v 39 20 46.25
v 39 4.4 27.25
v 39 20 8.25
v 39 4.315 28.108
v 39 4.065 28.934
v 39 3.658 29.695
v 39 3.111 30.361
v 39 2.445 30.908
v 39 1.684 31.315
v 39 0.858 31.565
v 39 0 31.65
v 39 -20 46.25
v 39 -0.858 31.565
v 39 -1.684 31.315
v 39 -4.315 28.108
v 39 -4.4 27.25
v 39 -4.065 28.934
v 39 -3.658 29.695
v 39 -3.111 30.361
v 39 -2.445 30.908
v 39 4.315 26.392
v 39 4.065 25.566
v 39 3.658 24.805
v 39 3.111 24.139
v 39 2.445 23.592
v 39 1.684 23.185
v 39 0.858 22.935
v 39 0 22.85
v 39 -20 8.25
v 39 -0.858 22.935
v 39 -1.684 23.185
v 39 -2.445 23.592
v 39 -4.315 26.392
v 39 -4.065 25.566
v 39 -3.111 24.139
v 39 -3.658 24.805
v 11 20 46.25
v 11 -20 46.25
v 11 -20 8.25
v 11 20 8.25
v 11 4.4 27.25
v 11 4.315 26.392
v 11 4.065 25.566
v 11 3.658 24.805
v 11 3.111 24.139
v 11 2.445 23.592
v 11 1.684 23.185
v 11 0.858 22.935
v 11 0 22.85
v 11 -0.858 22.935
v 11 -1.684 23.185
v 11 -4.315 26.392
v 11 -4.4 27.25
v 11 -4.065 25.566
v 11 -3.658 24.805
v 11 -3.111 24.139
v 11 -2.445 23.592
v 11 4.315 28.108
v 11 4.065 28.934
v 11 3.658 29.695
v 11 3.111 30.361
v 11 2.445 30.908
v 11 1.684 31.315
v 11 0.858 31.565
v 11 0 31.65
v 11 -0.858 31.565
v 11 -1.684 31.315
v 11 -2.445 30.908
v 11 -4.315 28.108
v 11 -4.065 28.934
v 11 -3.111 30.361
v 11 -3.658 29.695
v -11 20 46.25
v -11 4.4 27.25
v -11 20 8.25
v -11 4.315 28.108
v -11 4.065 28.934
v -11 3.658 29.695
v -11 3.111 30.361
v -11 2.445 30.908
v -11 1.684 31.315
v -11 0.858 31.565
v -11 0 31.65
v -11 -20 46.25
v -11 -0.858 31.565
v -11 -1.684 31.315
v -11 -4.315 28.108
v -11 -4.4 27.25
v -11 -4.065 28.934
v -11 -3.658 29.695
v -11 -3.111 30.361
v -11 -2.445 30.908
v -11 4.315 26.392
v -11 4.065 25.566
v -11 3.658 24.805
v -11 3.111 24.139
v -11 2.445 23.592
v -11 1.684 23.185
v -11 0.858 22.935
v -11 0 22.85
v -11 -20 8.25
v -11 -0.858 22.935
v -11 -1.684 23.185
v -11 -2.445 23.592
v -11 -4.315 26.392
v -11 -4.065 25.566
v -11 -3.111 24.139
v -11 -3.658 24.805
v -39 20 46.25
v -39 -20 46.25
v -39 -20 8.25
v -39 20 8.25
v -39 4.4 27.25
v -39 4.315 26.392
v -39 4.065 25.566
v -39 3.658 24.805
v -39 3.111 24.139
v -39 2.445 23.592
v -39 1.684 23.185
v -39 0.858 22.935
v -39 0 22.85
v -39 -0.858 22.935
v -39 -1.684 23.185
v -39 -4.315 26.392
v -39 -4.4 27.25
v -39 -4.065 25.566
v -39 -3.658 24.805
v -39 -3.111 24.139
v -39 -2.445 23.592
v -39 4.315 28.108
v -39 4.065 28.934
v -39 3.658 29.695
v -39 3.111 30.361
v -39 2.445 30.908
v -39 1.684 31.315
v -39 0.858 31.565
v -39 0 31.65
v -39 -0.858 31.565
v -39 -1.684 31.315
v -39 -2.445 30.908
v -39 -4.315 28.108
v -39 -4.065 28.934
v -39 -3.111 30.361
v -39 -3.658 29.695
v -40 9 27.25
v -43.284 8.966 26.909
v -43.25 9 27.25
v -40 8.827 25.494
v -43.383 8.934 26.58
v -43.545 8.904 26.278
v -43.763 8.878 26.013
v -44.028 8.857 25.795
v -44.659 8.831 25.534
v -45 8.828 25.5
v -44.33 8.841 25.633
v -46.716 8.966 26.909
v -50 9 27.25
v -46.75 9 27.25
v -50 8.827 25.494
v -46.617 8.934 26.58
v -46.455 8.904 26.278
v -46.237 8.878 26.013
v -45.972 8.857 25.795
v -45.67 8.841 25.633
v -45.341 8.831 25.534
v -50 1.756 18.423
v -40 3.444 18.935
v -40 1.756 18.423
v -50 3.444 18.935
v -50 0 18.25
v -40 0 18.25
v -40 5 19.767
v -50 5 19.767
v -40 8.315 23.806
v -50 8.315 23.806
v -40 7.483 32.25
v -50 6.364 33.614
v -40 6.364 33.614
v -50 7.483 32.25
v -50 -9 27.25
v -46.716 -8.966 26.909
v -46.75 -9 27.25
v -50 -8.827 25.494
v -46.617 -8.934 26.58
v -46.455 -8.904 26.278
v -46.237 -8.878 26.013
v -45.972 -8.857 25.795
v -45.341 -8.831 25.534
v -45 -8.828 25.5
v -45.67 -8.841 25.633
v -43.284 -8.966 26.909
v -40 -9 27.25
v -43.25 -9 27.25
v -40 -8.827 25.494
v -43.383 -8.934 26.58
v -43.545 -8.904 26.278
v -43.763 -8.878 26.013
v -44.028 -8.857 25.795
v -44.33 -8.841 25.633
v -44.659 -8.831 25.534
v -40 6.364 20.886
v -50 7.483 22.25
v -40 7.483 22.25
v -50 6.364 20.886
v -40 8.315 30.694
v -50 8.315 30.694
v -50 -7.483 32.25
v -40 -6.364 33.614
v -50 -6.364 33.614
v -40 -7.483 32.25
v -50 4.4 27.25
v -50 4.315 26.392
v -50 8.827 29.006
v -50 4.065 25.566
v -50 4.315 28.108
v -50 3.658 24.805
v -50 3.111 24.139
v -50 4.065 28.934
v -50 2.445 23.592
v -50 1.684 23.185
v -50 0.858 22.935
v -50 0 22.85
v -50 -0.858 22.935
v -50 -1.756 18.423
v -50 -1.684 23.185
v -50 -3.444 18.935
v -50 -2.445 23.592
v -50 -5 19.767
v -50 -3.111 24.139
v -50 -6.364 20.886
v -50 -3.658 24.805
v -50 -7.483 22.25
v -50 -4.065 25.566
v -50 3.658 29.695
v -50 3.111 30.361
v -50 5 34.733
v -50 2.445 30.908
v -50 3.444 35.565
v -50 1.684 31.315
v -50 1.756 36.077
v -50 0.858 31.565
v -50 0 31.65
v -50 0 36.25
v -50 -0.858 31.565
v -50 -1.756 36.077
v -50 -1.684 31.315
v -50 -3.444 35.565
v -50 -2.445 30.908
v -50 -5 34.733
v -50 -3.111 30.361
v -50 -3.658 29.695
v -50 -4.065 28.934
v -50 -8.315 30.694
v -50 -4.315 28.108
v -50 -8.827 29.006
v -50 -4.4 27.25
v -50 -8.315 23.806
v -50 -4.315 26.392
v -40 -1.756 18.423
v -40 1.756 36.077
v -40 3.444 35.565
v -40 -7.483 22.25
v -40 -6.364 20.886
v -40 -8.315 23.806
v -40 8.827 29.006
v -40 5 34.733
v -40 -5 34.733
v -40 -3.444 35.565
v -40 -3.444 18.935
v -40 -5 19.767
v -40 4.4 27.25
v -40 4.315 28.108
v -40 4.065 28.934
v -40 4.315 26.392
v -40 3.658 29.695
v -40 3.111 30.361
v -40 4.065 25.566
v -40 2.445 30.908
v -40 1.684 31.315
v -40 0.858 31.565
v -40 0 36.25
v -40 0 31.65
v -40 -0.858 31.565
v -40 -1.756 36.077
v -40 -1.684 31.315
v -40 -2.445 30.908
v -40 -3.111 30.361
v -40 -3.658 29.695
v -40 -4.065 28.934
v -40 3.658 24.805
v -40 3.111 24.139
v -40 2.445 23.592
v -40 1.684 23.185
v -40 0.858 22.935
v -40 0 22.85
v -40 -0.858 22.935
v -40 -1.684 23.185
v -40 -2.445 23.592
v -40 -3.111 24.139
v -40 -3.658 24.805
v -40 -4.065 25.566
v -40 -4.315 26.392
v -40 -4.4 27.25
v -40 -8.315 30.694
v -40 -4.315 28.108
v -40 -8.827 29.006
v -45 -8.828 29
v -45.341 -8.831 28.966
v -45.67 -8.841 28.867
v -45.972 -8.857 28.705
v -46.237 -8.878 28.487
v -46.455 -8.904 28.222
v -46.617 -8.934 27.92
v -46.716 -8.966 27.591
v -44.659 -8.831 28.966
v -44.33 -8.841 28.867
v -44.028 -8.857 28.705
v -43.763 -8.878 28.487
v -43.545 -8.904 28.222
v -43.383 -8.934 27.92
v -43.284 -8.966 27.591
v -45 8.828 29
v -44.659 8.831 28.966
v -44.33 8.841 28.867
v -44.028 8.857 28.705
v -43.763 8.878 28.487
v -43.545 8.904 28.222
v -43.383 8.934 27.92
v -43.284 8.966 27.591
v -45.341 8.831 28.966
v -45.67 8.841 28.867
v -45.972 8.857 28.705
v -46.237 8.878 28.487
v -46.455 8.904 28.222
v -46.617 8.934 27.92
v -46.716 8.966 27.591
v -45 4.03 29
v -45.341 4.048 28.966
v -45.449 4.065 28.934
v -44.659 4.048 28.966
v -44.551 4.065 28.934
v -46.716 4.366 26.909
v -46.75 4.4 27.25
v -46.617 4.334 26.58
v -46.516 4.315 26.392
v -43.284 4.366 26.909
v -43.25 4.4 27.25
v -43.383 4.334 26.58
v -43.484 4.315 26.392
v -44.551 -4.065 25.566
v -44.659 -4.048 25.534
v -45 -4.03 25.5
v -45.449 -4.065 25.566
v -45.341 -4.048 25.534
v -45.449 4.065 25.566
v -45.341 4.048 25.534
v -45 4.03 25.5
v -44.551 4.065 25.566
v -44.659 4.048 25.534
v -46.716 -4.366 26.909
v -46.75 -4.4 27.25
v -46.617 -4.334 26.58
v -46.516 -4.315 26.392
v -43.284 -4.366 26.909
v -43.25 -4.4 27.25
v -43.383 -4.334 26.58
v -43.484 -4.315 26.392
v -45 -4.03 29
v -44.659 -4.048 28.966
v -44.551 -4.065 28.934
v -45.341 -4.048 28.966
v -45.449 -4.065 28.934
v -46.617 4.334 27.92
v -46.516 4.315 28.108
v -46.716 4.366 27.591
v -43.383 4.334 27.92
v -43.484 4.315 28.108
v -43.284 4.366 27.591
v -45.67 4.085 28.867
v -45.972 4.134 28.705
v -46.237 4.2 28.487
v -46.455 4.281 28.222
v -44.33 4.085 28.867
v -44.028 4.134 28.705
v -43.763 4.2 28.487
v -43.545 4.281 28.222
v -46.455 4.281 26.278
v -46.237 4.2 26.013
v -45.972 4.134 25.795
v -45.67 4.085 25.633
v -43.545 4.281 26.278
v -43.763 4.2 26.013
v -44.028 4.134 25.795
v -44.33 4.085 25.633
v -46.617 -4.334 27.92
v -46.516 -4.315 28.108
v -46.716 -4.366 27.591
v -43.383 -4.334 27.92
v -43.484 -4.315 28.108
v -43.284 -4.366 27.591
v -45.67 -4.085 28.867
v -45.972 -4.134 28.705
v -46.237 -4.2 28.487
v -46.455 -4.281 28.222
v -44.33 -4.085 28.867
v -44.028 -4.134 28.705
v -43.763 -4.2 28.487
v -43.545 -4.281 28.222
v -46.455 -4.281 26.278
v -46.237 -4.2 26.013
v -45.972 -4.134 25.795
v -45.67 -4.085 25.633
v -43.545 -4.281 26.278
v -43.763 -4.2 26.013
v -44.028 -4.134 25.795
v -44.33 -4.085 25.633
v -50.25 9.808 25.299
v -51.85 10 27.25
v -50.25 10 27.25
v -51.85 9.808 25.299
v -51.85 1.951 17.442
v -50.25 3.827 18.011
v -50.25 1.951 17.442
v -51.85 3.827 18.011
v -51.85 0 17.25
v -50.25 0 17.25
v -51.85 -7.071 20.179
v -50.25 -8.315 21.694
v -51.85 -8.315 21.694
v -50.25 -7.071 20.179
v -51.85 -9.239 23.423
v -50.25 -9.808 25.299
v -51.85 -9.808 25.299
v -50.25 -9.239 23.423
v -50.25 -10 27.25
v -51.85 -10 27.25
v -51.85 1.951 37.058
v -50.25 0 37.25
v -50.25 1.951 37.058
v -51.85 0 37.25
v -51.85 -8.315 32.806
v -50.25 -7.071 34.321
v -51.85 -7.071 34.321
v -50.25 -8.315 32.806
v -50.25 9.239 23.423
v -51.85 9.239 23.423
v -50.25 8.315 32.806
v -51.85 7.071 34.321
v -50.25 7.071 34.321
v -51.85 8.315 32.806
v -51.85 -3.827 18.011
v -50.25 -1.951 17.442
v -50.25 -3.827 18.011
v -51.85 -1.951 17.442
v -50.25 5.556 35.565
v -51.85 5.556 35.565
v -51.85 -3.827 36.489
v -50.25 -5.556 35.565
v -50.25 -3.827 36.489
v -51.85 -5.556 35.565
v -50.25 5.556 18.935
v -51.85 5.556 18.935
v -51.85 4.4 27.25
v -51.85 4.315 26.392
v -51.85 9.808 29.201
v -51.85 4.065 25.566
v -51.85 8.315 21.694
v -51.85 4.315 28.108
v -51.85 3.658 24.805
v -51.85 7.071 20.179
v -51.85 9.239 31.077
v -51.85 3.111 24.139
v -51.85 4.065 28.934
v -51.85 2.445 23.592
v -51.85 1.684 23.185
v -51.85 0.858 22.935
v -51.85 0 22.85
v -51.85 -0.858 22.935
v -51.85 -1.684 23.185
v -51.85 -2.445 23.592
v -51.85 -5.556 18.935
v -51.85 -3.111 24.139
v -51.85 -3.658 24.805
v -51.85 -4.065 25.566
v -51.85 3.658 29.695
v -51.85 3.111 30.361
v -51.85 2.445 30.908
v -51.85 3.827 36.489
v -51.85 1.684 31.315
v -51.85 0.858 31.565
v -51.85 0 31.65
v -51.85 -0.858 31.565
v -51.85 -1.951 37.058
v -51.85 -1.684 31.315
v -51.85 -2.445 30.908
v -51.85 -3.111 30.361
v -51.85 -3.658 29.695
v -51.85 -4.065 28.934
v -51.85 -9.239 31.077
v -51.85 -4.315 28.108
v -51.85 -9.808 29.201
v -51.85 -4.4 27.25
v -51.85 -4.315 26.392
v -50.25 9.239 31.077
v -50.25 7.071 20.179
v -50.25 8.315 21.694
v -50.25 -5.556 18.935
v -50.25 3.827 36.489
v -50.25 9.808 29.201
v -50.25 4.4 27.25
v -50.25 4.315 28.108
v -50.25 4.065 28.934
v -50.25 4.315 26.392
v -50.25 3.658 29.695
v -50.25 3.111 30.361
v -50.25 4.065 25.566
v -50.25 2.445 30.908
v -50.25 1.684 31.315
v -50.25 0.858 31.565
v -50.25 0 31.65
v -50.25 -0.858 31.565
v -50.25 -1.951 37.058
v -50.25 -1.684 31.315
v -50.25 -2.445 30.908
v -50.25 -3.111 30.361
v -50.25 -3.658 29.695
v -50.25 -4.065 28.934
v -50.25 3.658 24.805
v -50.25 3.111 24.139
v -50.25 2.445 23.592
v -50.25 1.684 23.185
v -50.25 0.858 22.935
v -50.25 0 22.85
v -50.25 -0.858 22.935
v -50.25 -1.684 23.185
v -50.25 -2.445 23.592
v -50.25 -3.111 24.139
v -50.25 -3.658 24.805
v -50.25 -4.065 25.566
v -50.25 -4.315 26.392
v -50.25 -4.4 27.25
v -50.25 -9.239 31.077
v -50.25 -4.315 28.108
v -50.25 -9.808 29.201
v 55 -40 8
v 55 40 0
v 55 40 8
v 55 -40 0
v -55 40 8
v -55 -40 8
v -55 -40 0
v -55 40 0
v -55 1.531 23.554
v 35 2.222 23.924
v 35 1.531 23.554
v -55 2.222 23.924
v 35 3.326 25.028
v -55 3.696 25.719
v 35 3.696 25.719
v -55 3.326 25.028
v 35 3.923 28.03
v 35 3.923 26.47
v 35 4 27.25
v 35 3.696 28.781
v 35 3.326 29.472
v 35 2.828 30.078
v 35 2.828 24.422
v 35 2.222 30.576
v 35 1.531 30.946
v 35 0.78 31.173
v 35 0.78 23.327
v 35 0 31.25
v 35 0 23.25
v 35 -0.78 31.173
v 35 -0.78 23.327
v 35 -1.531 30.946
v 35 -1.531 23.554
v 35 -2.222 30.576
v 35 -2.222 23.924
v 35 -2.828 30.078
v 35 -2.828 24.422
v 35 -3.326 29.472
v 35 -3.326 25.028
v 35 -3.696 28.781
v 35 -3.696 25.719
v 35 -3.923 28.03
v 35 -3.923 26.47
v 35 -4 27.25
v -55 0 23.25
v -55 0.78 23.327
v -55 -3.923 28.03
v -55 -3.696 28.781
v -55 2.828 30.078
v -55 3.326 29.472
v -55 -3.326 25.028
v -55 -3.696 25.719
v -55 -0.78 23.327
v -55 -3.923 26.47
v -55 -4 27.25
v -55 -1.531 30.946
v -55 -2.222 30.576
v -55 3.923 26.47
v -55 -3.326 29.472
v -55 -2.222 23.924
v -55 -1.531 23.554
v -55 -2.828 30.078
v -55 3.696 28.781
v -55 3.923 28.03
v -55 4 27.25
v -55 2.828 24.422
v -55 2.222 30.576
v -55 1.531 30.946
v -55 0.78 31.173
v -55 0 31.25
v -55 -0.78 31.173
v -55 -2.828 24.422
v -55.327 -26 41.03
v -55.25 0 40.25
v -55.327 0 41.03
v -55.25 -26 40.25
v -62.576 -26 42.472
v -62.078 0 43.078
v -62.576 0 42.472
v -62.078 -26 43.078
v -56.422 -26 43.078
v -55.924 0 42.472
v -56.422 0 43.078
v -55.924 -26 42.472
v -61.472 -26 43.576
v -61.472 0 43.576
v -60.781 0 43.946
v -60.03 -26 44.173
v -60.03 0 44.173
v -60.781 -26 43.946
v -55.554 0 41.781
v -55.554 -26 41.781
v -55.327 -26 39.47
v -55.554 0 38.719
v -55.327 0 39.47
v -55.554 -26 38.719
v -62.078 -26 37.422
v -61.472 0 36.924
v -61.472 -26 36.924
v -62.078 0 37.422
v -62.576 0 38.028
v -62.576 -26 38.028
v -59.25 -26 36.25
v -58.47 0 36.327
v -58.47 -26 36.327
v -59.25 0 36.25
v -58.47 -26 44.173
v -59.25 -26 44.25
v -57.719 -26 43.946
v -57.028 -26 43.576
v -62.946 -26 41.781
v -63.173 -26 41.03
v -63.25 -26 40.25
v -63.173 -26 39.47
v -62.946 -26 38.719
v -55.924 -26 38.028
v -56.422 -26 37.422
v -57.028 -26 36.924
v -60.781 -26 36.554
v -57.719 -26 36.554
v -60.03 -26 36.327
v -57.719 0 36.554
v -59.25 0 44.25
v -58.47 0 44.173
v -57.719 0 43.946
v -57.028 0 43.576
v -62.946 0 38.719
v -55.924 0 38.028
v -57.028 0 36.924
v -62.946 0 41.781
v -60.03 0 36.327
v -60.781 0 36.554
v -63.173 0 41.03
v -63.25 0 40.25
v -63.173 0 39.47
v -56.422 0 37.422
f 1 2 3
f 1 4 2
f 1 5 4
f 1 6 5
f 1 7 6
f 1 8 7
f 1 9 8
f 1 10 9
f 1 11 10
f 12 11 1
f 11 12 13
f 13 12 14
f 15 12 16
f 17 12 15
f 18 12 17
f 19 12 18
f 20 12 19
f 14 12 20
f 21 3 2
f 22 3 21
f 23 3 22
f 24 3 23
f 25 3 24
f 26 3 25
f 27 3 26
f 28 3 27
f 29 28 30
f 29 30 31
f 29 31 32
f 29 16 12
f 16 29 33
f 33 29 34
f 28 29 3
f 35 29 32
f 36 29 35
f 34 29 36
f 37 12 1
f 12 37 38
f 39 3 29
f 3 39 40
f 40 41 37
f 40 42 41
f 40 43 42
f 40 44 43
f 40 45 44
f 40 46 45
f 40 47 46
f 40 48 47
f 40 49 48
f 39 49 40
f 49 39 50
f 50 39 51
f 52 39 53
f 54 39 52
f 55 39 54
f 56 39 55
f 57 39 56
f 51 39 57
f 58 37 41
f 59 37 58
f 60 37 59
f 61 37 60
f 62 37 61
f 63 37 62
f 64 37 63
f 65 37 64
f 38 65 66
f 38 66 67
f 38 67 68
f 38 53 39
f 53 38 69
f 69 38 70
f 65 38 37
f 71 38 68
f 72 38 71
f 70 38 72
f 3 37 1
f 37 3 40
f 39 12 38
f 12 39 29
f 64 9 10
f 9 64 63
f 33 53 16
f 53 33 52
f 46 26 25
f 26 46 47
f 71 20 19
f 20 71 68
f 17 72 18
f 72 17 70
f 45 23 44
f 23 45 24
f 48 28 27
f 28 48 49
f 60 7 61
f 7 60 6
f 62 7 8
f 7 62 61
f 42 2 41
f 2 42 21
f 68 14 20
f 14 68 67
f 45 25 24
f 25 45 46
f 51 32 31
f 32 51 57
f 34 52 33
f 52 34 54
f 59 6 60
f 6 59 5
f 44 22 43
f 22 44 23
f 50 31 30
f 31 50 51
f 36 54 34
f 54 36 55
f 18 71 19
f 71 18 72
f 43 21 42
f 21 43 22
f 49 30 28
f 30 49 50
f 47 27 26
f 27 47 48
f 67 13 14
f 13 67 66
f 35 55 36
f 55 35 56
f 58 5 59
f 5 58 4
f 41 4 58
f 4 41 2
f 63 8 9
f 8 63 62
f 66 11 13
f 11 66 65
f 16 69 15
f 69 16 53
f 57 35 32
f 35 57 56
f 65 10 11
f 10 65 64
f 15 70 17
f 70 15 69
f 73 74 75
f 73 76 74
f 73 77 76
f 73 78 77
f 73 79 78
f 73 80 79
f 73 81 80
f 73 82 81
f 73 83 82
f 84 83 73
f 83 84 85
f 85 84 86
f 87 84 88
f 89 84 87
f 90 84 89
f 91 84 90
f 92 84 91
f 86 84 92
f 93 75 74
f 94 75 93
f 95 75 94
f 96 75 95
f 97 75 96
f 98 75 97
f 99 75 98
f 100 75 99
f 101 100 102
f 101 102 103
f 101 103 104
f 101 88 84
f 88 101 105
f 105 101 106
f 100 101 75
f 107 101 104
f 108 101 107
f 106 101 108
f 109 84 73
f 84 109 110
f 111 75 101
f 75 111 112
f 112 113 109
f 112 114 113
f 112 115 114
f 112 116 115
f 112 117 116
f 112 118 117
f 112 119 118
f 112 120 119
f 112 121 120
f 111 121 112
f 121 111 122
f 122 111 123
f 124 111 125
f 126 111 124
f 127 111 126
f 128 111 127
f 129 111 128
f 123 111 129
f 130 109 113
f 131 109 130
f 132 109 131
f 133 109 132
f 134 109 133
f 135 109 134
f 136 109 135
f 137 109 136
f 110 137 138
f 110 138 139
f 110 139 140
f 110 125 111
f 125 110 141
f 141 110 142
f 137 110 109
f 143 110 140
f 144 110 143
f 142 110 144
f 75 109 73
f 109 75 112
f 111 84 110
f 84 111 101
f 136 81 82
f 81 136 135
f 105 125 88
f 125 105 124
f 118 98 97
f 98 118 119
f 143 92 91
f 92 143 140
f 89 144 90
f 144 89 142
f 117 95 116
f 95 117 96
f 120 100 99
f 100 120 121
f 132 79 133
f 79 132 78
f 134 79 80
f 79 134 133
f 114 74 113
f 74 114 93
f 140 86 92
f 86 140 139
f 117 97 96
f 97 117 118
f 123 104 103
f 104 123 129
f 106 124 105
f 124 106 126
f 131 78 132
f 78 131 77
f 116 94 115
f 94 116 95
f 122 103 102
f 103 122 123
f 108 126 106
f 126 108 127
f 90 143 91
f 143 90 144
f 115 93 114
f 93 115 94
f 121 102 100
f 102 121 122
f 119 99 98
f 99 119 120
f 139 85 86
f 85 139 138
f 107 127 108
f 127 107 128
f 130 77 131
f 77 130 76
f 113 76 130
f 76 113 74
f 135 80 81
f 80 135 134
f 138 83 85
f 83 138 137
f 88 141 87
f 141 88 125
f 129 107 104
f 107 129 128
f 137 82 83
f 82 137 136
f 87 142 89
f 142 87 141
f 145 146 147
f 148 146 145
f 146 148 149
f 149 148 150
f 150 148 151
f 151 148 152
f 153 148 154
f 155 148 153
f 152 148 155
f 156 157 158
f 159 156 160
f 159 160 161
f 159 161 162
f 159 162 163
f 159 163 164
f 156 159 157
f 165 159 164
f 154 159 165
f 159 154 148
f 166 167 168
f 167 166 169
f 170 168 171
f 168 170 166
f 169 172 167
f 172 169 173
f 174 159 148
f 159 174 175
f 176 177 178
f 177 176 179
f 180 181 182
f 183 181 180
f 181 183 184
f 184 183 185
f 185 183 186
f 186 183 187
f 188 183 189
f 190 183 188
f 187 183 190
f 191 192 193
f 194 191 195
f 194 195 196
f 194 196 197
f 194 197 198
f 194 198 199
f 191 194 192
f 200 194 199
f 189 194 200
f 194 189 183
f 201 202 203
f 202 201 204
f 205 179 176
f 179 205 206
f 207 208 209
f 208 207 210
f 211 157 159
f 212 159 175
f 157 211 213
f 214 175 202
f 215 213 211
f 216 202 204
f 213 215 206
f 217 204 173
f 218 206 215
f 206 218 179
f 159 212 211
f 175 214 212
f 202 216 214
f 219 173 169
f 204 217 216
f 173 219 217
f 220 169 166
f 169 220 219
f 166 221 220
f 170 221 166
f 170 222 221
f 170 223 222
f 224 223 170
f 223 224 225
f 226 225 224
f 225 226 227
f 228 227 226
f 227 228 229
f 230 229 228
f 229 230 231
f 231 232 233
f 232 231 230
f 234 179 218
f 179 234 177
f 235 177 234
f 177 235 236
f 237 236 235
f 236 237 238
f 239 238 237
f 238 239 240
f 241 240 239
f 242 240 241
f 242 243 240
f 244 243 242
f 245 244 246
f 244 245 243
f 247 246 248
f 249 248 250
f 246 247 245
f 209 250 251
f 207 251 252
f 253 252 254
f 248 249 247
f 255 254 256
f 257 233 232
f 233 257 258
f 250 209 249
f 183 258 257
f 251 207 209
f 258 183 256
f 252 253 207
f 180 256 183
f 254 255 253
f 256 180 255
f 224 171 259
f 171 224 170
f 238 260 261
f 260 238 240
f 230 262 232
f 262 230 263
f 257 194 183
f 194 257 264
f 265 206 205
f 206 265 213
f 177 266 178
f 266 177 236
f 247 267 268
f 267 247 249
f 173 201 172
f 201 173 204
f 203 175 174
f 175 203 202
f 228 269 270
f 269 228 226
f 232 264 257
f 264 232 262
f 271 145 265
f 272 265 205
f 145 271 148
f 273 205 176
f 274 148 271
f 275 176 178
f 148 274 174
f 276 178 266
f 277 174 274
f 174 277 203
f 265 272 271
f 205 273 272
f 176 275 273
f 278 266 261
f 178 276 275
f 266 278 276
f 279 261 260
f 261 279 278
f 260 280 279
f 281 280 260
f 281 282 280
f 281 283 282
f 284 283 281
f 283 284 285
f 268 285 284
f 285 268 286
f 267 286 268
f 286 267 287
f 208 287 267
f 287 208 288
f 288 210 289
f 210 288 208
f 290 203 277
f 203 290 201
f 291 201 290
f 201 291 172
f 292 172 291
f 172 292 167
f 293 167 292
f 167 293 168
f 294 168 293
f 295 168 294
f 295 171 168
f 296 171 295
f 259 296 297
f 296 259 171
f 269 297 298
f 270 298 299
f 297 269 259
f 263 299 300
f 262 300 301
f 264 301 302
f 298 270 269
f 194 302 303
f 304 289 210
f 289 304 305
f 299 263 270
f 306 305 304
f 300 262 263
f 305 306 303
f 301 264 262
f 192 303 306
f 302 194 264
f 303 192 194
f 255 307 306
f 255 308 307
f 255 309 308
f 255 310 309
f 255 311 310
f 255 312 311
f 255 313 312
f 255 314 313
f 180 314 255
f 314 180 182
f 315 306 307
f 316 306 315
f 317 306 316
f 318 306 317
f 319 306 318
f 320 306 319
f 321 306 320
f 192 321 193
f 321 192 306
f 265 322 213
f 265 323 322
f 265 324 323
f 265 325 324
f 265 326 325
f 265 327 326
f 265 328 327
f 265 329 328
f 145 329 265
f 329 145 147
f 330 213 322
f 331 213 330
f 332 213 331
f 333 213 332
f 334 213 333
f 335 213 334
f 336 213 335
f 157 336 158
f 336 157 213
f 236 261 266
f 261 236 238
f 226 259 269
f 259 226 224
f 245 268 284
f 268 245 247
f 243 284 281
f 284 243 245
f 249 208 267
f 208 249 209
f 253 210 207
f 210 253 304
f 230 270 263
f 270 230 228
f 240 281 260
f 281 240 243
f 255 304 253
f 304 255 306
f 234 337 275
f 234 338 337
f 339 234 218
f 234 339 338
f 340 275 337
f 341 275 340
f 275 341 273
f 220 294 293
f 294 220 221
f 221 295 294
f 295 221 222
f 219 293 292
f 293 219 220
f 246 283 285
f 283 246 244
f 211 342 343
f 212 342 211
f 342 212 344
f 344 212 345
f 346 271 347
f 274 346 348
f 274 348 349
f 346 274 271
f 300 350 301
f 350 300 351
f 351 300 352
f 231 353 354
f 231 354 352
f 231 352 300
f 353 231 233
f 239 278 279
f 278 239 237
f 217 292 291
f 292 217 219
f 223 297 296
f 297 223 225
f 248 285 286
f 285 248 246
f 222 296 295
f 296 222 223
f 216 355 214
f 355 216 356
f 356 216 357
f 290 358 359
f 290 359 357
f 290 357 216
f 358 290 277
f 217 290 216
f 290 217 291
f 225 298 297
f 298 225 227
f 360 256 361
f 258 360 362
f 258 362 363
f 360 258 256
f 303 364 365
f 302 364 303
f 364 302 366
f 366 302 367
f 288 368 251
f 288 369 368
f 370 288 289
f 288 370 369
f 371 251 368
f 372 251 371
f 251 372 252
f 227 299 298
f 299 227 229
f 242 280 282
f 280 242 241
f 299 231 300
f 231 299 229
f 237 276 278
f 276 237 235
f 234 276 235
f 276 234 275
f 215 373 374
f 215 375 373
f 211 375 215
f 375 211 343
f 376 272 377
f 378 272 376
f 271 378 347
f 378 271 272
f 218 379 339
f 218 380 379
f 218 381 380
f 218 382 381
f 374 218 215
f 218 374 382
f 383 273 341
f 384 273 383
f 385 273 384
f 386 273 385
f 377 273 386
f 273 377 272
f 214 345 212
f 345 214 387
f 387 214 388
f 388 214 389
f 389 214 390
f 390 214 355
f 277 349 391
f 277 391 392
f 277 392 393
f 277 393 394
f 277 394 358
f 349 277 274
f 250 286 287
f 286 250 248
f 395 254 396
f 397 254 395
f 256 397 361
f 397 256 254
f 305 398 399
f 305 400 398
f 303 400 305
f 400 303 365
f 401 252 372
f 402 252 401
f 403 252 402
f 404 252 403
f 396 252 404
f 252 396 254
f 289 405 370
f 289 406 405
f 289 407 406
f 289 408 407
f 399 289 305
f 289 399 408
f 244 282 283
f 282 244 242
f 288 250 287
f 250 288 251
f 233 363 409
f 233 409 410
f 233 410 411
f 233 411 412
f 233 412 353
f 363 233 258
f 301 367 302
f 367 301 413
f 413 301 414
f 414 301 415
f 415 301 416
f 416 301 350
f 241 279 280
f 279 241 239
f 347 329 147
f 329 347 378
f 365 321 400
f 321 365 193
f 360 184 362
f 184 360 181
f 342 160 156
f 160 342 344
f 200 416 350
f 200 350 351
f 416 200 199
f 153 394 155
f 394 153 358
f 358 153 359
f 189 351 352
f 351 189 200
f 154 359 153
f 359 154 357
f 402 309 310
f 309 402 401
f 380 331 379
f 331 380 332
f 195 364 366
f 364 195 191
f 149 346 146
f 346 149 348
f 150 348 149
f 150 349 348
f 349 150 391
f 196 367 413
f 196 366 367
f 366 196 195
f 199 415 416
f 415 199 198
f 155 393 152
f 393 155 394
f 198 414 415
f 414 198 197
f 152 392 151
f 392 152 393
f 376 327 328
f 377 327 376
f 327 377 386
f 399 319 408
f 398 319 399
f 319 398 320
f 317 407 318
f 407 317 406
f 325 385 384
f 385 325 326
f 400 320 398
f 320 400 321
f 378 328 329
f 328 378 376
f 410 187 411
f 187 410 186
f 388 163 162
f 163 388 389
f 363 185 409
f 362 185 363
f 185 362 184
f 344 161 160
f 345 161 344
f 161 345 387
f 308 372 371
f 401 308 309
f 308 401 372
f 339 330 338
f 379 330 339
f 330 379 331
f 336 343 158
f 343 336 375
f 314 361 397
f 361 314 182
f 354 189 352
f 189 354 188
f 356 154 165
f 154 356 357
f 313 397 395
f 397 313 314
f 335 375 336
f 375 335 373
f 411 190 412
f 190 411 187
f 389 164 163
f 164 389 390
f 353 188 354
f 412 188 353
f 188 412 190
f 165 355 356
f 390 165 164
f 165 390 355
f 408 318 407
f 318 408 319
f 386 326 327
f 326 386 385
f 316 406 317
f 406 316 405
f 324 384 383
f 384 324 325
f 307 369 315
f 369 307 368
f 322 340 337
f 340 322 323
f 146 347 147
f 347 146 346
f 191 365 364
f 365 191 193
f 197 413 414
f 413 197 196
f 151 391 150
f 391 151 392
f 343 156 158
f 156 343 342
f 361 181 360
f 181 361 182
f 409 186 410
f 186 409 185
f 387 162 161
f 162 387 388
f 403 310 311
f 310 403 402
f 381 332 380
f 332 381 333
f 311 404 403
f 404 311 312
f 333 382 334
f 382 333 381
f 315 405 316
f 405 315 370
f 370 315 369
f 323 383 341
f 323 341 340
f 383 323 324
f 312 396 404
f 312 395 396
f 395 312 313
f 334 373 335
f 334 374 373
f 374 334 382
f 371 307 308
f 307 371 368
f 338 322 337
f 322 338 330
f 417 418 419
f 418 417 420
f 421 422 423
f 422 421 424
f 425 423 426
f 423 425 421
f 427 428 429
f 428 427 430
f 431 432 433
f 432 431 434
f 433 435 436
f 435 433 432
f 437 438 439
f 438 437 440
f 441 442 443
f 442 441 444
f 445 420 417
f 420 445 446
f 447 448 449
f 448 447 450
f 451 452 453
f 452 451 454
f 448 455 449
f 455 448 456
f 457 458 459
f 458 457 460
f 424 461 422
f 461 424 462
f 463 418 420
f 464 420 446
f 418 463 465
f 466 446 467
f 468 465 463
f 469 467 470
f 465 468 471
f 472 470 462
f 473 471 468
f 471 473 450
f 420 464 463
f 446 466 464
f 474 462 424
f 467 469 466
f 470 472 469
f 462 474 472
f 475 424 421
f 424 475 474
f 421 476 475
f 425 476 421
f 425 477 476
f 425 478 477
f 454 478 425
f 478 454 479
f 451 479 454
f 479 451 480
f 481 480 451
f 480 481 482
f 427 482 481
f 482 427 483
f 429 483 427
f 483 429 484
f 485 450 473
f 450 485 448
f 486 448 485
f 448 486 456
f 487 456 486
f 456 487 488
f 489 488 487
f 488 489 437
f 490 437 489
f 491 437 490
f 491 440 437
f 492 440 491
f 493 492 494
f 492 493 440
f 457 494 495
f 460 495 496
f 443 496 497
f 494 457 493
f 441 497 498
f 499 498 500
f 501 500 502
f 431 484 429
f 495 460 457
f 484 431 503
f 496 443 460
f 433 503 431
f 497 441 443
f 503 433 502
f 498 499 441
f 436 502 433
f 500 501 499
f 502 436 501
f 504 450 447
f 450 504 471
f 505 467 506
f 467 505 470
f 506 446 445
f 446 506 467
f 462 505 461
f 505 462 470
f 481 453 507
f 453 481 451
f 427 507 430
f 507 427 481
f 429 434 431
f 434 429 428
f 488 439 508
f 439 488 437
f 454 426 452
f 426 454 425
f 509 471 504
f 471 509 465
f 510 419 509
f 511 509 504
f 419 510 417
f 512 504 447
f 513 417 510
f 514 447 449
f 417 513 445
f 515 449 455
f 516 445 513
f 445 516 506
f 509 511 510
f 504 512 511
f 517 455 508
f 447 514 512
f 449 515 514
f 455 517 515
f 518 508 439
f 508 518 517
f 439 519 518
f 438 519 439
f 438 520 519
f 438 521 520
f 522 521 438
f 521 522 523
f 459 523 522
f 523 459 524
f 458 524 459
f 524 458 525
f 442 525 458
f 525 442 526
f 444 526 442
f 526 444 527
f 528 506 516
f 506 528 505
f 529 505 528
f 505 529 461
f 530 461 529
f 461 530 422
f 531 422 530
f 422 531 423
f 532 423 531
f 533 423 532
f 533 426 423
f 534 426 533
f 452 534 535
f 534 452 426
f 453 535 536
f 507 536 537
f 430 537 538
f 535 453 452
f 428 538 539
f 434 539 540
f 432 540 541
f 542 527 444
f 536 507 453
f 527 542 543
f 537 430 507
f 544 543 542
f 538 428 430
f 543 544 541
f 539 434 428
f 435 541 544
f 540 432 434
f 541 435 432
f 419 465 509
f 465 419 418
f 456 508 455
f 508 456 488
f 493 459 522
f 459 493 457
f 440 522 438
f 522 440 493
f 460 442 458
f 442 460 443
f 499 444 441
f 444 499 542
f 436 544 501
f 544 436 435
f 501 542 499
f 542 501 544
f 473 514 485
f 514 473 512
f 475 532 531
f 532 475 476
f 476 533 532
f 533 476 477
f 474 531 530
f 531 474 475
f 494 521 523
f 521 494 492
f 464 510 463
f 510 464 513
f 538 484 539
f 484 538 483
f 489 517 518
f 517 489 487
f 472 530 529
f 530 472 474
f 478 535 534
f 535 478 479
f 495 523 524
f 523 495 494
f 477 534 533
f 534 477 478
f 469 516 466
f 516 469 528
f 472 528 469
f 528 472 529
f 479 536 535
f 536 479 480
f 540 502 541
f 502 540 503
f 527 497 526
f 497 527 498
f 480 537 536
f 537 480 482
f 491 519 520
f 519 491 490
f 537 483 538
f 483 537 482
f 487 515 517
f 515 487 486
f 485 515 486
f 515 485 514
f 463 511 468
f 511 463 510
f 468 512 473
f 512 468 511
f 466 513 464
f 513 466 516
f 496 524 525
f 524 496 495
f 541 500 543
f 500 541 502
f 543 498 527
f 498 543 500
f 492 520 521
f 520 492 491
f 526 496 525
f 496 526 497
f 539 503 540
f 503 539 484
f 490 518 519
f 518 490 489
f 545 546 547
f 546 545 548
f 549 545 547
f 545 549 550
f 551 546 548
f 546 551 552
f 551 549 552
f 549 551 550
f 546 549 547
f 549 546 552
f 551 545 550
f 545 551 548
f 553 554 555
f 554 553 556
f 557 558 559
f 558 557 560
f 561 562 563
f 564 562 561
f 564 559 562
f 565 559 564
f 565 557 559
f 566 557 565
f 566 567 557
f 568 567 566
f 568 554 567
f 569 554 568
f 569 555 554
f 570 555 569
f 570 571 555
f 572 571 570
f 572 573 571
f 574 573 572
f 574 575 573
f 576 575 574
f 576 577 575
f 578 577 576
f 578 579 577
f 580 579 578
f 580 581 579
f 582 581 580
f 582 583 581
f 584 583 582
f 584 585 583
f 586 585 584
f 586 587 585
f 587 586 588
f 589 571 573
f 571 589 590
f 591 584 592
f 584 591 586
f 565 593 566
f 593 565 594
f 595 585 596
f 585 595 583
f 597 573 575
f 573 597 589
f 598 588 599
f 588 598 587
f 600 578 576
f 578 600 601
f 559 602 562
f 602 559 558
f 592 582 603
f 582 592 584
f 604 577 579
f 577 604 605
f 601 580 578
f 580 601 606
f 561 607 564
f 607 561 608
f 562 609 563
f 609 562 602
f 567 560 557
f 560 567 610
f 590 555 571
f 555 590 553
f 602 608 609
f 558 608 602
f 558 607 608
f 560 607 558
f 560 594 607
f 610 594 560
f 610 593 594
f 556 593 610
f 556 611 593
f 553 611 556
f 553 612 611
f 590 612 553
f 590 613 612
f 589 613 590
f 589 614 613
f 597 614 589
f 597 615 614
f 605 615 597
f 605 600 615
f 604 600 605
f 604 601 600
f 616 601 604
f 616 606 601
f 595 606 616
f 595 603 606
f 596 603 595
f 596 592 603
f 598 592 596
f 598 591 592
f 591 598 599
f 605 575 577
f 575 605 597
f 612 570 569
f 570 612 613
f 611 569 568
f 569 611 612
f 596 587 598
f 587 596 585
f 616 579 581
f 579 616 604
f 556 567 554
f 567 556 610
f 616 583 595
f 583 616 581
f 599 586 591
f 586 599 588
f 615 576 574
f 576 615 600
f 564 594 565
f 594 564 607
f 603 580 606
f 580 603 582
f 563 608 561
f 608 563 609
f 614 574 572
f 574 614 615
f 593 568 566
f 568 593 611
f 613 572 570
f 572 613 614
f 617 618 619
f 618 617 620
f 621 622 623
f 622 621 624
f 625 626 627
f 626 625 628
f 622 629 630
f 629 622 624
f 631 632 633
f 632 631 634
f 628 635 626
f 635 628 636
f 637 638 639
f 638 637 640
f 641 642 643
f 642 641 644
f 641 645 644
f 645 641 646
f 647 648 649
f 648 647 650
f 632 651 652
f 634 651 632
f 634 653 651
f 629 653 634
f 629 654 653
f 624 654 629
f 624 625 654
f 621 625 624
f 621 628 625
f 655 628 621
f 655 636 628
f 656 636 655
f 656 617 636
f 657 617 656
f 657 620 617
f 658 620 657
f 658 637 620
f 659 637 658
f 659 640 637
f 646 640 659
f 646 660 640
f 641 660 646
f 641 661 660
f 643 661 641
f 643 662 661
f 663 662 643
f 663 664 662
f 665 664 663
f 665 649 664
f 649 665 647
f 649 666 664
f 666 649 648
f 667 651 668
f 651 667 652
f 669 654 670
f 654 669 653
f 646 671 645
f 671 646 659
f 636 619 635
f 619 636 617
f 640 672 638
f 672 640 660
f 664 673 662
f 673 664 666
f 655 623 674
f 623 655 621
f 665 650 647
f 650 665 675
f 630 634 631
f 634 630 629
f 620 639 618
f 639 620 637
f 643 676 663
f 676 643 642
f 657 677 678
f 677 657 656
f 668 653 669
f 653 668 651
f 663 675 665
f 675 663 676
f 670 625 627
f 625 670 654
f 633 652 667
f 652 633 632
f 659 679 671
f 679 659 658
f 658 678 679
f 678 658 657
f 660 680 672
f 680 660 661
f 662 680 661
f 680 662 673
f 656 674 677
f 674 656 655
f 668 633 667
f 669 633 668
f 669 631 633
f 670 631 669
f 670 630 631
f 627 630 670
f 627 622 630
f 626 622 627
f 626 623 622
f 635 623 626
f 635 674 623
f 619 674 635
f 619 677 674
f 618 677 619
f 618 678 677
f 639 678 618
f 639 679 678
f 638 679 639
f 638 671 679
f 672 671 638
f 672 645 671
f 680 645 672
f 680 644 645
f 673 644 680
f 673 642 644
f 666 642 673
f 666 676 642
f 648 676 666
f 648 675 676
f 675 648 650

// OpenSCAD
$fn = 32;

// ------------------------------------------------------------------------
// Machine vise: screw d8, jaws 28 x 38 mm
// Every part is its own module, assembly() places every instance.
// ------------------------------------------------------------------------

// --- part 1 ---
module vise_bed() {
  difference() {
    translate([-55, -40, 0]) cube([110, 80, 8]);
  }
}

// --- part 2 ---
module vise_jaw() {
  difference() {
    translate([-14, -20, 0]) cube([28, 40, 38]);
    translate([0, 0, 19]) rotate([0, 90, 0]) cylinder(h = 30, d = 8.8, center = true);
  }
}

// --- part 3 ---
module vise_screw() {
  translate([0, 0, -45]) cylinder(h = 90, d = 8);
}

// --- part 4 ---
module screw_collar() {
  difference() {
    cylinder(h = 10, d = 18);
    translate([0, 0, -1]) cylinder(h = 12, d = 8.8);
    translate([0, 0, 5]) rotate([90, 0, 0]) cylinder(h = 20, d = 3.5, center = true);
  }
}

// --- part 5 ---
module screw_washer() {
  difference() {
      translate([0, 0, 0]) cylinder(h = 1.6, d = 20);
      translate([0, 0, -1]) cylinder(h = 3.6, d = 8.8);
    }
}

// --- part 6 ---
module vise_handle() {
  cylinder(h = 26, d = 8);
}

// --- assembly ---
module assembly() {
  color([0.80, 0.24, 0.20]) translate([0, 0, 0]) rotate([0, 0, 0]) vise_bed();
  color([0.20, 0.45, 0.75]) translate([25, 0, 8.25]) rotate([0, 0, 0]) vise_jaw();
  color([0.25, 0.62, 0.32]) translate([-25, 0, 8.25]) rotate([0, 0, 0]) vise_jaw();
  color([0.92, 0.70, 0.18]) translate([-10, 0, 27.25]) rotate([0, 90, 0]) vise_screw();
  color([0.58, 0.35, 0.70]) translate([-50, 0, 27.25]) rotate([0, 90, 0]) screw_collar();
  color([0.16, 0.66, 0.66]) translate([-51.85, 0, 27.25]) rotate([0, 90, 0]) screw_washer();
  color([0.85, 0.48, 0.18]) translate([-59.25, 0, 40.25]) rotate([90, 0, 0]) vise_handle();
}

assembly();
